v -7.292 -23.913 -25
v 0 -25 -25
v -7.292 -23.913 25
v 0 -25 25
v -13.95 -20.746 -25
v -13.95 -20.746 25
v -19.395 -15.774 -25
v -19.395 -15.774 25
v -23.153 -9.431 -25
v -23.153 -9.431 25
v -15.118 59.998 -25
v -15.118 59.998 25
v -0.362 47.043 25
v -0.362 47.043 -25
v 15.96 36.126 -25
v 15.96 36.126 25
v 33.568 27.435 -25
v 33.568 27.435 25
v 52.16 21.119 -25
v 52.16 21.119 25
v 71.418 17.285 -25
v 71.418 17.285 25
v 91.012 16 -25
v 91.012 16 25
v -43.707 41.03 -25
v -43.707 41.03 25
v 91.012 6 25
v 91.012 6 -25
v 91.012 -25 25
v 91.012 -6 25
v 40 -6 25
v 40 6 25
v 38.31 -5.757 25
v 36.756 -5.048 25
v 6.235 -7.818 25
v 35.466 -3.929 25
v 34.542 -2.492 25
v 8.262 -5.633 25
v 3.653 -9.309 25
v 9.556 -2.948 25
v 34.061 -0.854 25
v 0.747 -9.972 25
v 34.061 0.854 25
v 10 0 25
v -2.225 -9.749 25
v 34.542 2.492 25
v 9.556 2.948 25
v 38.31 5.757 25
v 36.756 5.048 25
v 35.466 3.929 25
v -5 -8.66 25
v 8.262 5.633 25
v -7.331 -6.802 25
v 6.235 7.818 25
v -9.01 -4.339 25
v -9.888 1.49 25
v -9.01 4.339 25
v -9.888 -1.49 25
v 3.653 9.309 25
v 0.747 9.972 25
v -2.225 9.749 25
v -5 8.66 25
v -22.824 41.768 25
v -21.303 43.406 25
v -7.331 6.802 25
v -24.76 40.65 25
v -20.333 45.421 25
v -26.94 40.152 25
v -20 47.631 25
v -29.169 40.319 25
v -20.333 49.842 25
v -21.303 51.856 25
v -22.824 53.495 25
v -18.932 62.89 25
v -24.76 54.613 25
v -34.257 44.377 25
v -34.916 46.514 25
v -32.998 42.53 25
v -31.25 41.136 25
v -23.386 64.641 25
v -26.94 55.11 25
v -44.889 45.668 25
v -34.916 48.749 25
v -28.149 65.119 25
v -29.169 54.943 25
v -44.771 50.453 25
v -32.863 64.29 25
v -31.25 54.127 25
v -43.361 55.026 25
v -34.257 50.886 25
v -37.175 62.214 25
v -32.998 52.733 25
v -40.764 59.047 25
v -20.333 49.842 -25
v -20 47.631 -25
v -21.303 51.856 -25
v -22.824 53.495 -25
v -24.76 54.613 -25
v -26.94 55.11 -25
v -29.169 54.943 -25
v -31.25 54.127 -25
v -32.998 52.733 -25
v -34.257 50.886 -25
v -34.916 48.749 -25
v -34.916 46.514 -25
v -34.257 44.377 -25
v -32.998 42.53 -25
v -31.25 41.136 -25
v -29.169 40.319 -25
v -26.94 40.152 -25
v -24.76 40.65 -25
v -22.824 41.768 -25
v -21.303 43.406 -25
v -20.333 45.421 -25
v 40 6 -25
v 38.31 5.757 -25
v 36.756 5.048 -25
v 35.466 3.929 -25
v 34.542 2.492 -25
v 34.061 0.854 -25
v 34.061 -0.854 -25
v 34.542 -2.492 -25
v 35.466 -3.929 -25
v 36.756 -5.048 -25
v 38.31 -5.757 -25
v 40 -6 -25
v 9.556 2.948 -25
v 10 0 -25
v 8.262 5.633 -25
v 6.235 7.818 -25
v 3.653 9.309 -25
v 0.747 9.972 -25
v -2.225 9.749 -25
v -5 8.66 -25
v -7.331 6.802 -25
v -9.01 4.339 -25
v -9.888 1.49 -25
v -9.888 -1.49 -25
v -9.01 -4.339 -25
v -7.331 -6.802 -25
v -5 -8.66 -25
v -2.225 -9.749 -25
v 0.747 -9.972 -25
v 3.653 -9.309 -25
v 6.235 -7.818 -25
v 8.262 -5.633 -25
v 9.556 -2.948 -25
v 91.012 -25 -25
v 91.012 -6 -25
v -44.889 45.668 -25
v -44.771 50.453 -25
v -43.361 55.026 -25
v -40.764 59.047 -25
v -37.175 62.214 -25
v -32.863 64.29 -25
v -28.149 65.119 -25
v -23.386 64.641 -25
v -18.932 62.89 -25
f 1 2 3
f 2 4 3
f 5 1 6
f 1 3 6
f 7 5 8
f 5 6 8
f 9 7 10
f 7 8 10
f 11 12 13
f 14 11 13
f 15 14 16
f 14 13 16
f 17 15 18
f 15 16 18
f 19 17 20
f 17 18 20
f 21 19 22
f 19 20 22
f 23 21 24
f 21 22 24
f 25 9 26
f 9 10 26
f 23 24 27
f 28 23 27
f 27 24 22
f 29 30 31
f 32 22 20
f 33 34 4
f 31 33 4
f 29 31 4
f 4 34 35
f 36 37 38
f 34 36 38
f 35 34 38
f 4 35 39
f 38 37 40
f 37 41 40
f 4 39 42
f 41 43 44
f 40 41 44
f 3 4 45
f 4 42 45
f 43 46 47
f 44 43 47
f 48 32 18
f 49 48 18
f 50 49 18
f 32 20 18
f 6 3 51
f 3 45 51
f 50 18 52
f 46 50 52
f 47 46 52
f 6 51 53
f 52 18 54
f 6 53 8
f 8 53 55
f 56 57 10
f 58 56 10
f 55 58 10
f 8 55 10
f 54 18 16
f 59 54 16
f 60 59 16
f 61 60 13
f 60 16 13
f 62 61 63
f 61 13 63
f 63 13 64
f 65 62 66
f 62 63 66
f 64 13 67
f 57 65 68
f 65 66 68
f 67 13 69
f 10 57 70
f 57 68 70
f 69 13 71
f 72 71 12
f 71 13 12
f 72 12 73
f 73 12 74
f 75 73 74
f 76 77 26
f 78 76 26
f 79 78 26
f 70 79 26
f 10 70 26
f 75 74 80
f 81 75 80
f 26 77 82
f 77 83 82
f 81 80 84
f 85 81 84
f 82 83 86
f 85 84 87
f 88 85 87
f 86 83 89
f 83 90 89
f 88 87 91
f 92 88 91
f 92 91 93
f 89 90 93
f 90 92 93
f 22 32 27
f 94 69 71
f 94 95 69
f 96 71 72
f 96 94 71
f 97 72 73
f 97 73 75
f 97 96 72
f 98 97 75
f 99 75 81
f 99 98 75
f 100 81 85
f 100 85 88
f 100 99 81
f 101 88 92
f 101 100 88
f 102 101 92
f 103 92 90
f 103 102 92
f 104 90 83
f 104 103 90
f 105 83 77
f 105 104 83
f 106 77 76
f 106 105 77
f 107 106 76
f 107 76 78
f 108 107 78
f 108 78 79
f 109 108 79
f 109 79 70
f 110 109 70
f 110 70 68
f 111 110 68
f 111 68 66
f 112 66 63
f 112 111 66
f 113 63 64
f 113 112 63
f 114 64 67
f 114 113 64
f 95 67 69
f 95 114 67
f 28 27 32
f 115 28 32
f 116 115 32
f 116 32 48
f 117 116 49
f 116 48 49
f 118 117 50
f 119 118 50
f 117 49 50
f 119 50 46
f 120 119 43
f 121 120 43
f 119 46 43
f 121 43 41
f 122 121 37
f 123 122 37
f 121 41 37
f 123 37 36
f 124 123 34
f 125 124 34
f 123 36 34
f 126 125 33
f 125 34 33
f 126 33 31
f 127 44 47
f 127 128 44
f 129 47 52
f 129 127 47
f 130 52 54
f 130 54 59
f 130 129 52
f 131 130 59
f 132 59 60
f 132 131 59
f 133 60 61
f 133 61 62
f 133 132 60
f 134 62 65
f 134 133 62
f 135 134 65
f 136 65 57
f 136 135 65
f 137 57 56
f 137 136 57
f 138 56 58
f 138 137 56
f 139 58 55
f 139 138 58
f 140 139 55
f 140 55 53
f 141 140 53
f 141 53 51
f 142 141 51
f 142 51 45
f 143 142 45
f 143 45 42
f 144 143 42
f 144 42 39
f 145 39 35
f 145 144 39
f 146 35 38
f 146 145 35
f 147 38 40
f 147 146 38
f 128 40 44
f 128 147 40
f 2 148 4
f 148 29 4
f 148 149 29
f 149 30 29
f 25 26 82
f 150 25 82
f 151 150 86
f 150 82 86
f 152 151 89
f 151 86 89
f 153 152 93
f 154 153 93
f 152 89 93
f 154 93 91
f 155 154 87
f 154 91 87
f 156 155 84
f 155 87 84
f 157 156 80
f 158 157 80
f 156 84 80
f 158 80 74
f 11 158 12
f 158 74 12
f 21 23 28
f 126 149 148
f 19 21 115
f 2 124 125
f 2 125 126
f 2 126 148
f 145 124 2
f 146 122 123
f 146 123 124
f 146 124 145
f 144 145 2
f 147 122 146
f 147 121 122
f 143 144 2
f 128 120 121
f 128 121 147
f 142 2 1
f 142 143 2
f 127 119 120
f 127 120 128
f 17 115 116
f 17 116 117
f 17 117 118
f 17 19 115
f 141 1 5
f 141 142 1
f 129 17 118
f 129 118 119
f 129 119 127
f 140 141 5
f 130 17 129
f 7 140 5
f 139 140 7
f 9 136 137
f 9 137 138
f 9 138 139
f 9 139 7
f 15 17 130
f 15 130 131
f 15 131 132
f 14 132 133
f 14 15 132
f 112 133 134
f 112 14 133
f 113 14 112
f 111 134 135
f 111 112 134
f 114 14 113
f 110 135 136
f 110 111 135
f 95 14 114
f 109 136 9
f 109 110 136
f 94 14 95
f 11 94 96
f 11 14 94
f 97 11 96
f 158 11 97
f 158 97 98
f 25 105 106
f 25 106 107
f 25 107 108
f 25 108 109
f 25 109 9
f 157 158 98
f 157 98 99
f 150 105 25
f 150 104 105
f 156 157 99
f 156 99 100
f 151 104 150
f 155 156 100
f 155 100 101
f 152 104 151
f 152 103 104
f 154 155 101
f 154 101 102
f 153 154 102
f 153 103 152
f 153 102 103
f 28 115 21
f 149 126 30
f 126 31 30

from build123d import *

# Parameters (mm, degrees)
SKETCH1_R           = 7.5
SKETCH1_R_2         = 10
BOSS_EXTRUDE1_DEPTH = 25


with BuildPart() as part:
    # Sketch1 → Boss-Extrude1 (new, symmetric)
    with BuildSketch(Plane.XY):
        with BuildLine():
            ThreePointArc((40, 6), (34, 0), (40, -6))
            Line((40, -6), (91.012125426, -6))
            Line((91.012125426, -6), (91.012125426, -25))
            Line((91.012125426, -25), (0, -25))
            ThreePointArc((0, -25), (-13.950413836, -20.745745439), (-23.152938737, -9.430876304))
            Line((-23.152938737, -9.430876304), (-43.707057116, 41.029783795))
            ThreePointArc((-43.707057116, 41.029783795), (-37.175167009, 62.213617319), (-15.118136149, 59.998266157))
            ThreePointArc((-15.118136149, 59.998266157), (33.56763081, 27.43546616), (91.012125426, 16))
            Line((91.012125426, 16), (91.012125426, 6))
            Line((91.012125426, 6), (40, 6))
        make_face()
        with Locations((-27.5, 47.631397208)):
            Circle(SKETCH1_R, mode=Mode.SUBTRACT)
        Circle(SKETCH1_R_2, mode=Mode.SUBTRACT)
    extrude(amount=BOSS_EXTRUDE1_DEPTH, both=True)


solid = part.part
